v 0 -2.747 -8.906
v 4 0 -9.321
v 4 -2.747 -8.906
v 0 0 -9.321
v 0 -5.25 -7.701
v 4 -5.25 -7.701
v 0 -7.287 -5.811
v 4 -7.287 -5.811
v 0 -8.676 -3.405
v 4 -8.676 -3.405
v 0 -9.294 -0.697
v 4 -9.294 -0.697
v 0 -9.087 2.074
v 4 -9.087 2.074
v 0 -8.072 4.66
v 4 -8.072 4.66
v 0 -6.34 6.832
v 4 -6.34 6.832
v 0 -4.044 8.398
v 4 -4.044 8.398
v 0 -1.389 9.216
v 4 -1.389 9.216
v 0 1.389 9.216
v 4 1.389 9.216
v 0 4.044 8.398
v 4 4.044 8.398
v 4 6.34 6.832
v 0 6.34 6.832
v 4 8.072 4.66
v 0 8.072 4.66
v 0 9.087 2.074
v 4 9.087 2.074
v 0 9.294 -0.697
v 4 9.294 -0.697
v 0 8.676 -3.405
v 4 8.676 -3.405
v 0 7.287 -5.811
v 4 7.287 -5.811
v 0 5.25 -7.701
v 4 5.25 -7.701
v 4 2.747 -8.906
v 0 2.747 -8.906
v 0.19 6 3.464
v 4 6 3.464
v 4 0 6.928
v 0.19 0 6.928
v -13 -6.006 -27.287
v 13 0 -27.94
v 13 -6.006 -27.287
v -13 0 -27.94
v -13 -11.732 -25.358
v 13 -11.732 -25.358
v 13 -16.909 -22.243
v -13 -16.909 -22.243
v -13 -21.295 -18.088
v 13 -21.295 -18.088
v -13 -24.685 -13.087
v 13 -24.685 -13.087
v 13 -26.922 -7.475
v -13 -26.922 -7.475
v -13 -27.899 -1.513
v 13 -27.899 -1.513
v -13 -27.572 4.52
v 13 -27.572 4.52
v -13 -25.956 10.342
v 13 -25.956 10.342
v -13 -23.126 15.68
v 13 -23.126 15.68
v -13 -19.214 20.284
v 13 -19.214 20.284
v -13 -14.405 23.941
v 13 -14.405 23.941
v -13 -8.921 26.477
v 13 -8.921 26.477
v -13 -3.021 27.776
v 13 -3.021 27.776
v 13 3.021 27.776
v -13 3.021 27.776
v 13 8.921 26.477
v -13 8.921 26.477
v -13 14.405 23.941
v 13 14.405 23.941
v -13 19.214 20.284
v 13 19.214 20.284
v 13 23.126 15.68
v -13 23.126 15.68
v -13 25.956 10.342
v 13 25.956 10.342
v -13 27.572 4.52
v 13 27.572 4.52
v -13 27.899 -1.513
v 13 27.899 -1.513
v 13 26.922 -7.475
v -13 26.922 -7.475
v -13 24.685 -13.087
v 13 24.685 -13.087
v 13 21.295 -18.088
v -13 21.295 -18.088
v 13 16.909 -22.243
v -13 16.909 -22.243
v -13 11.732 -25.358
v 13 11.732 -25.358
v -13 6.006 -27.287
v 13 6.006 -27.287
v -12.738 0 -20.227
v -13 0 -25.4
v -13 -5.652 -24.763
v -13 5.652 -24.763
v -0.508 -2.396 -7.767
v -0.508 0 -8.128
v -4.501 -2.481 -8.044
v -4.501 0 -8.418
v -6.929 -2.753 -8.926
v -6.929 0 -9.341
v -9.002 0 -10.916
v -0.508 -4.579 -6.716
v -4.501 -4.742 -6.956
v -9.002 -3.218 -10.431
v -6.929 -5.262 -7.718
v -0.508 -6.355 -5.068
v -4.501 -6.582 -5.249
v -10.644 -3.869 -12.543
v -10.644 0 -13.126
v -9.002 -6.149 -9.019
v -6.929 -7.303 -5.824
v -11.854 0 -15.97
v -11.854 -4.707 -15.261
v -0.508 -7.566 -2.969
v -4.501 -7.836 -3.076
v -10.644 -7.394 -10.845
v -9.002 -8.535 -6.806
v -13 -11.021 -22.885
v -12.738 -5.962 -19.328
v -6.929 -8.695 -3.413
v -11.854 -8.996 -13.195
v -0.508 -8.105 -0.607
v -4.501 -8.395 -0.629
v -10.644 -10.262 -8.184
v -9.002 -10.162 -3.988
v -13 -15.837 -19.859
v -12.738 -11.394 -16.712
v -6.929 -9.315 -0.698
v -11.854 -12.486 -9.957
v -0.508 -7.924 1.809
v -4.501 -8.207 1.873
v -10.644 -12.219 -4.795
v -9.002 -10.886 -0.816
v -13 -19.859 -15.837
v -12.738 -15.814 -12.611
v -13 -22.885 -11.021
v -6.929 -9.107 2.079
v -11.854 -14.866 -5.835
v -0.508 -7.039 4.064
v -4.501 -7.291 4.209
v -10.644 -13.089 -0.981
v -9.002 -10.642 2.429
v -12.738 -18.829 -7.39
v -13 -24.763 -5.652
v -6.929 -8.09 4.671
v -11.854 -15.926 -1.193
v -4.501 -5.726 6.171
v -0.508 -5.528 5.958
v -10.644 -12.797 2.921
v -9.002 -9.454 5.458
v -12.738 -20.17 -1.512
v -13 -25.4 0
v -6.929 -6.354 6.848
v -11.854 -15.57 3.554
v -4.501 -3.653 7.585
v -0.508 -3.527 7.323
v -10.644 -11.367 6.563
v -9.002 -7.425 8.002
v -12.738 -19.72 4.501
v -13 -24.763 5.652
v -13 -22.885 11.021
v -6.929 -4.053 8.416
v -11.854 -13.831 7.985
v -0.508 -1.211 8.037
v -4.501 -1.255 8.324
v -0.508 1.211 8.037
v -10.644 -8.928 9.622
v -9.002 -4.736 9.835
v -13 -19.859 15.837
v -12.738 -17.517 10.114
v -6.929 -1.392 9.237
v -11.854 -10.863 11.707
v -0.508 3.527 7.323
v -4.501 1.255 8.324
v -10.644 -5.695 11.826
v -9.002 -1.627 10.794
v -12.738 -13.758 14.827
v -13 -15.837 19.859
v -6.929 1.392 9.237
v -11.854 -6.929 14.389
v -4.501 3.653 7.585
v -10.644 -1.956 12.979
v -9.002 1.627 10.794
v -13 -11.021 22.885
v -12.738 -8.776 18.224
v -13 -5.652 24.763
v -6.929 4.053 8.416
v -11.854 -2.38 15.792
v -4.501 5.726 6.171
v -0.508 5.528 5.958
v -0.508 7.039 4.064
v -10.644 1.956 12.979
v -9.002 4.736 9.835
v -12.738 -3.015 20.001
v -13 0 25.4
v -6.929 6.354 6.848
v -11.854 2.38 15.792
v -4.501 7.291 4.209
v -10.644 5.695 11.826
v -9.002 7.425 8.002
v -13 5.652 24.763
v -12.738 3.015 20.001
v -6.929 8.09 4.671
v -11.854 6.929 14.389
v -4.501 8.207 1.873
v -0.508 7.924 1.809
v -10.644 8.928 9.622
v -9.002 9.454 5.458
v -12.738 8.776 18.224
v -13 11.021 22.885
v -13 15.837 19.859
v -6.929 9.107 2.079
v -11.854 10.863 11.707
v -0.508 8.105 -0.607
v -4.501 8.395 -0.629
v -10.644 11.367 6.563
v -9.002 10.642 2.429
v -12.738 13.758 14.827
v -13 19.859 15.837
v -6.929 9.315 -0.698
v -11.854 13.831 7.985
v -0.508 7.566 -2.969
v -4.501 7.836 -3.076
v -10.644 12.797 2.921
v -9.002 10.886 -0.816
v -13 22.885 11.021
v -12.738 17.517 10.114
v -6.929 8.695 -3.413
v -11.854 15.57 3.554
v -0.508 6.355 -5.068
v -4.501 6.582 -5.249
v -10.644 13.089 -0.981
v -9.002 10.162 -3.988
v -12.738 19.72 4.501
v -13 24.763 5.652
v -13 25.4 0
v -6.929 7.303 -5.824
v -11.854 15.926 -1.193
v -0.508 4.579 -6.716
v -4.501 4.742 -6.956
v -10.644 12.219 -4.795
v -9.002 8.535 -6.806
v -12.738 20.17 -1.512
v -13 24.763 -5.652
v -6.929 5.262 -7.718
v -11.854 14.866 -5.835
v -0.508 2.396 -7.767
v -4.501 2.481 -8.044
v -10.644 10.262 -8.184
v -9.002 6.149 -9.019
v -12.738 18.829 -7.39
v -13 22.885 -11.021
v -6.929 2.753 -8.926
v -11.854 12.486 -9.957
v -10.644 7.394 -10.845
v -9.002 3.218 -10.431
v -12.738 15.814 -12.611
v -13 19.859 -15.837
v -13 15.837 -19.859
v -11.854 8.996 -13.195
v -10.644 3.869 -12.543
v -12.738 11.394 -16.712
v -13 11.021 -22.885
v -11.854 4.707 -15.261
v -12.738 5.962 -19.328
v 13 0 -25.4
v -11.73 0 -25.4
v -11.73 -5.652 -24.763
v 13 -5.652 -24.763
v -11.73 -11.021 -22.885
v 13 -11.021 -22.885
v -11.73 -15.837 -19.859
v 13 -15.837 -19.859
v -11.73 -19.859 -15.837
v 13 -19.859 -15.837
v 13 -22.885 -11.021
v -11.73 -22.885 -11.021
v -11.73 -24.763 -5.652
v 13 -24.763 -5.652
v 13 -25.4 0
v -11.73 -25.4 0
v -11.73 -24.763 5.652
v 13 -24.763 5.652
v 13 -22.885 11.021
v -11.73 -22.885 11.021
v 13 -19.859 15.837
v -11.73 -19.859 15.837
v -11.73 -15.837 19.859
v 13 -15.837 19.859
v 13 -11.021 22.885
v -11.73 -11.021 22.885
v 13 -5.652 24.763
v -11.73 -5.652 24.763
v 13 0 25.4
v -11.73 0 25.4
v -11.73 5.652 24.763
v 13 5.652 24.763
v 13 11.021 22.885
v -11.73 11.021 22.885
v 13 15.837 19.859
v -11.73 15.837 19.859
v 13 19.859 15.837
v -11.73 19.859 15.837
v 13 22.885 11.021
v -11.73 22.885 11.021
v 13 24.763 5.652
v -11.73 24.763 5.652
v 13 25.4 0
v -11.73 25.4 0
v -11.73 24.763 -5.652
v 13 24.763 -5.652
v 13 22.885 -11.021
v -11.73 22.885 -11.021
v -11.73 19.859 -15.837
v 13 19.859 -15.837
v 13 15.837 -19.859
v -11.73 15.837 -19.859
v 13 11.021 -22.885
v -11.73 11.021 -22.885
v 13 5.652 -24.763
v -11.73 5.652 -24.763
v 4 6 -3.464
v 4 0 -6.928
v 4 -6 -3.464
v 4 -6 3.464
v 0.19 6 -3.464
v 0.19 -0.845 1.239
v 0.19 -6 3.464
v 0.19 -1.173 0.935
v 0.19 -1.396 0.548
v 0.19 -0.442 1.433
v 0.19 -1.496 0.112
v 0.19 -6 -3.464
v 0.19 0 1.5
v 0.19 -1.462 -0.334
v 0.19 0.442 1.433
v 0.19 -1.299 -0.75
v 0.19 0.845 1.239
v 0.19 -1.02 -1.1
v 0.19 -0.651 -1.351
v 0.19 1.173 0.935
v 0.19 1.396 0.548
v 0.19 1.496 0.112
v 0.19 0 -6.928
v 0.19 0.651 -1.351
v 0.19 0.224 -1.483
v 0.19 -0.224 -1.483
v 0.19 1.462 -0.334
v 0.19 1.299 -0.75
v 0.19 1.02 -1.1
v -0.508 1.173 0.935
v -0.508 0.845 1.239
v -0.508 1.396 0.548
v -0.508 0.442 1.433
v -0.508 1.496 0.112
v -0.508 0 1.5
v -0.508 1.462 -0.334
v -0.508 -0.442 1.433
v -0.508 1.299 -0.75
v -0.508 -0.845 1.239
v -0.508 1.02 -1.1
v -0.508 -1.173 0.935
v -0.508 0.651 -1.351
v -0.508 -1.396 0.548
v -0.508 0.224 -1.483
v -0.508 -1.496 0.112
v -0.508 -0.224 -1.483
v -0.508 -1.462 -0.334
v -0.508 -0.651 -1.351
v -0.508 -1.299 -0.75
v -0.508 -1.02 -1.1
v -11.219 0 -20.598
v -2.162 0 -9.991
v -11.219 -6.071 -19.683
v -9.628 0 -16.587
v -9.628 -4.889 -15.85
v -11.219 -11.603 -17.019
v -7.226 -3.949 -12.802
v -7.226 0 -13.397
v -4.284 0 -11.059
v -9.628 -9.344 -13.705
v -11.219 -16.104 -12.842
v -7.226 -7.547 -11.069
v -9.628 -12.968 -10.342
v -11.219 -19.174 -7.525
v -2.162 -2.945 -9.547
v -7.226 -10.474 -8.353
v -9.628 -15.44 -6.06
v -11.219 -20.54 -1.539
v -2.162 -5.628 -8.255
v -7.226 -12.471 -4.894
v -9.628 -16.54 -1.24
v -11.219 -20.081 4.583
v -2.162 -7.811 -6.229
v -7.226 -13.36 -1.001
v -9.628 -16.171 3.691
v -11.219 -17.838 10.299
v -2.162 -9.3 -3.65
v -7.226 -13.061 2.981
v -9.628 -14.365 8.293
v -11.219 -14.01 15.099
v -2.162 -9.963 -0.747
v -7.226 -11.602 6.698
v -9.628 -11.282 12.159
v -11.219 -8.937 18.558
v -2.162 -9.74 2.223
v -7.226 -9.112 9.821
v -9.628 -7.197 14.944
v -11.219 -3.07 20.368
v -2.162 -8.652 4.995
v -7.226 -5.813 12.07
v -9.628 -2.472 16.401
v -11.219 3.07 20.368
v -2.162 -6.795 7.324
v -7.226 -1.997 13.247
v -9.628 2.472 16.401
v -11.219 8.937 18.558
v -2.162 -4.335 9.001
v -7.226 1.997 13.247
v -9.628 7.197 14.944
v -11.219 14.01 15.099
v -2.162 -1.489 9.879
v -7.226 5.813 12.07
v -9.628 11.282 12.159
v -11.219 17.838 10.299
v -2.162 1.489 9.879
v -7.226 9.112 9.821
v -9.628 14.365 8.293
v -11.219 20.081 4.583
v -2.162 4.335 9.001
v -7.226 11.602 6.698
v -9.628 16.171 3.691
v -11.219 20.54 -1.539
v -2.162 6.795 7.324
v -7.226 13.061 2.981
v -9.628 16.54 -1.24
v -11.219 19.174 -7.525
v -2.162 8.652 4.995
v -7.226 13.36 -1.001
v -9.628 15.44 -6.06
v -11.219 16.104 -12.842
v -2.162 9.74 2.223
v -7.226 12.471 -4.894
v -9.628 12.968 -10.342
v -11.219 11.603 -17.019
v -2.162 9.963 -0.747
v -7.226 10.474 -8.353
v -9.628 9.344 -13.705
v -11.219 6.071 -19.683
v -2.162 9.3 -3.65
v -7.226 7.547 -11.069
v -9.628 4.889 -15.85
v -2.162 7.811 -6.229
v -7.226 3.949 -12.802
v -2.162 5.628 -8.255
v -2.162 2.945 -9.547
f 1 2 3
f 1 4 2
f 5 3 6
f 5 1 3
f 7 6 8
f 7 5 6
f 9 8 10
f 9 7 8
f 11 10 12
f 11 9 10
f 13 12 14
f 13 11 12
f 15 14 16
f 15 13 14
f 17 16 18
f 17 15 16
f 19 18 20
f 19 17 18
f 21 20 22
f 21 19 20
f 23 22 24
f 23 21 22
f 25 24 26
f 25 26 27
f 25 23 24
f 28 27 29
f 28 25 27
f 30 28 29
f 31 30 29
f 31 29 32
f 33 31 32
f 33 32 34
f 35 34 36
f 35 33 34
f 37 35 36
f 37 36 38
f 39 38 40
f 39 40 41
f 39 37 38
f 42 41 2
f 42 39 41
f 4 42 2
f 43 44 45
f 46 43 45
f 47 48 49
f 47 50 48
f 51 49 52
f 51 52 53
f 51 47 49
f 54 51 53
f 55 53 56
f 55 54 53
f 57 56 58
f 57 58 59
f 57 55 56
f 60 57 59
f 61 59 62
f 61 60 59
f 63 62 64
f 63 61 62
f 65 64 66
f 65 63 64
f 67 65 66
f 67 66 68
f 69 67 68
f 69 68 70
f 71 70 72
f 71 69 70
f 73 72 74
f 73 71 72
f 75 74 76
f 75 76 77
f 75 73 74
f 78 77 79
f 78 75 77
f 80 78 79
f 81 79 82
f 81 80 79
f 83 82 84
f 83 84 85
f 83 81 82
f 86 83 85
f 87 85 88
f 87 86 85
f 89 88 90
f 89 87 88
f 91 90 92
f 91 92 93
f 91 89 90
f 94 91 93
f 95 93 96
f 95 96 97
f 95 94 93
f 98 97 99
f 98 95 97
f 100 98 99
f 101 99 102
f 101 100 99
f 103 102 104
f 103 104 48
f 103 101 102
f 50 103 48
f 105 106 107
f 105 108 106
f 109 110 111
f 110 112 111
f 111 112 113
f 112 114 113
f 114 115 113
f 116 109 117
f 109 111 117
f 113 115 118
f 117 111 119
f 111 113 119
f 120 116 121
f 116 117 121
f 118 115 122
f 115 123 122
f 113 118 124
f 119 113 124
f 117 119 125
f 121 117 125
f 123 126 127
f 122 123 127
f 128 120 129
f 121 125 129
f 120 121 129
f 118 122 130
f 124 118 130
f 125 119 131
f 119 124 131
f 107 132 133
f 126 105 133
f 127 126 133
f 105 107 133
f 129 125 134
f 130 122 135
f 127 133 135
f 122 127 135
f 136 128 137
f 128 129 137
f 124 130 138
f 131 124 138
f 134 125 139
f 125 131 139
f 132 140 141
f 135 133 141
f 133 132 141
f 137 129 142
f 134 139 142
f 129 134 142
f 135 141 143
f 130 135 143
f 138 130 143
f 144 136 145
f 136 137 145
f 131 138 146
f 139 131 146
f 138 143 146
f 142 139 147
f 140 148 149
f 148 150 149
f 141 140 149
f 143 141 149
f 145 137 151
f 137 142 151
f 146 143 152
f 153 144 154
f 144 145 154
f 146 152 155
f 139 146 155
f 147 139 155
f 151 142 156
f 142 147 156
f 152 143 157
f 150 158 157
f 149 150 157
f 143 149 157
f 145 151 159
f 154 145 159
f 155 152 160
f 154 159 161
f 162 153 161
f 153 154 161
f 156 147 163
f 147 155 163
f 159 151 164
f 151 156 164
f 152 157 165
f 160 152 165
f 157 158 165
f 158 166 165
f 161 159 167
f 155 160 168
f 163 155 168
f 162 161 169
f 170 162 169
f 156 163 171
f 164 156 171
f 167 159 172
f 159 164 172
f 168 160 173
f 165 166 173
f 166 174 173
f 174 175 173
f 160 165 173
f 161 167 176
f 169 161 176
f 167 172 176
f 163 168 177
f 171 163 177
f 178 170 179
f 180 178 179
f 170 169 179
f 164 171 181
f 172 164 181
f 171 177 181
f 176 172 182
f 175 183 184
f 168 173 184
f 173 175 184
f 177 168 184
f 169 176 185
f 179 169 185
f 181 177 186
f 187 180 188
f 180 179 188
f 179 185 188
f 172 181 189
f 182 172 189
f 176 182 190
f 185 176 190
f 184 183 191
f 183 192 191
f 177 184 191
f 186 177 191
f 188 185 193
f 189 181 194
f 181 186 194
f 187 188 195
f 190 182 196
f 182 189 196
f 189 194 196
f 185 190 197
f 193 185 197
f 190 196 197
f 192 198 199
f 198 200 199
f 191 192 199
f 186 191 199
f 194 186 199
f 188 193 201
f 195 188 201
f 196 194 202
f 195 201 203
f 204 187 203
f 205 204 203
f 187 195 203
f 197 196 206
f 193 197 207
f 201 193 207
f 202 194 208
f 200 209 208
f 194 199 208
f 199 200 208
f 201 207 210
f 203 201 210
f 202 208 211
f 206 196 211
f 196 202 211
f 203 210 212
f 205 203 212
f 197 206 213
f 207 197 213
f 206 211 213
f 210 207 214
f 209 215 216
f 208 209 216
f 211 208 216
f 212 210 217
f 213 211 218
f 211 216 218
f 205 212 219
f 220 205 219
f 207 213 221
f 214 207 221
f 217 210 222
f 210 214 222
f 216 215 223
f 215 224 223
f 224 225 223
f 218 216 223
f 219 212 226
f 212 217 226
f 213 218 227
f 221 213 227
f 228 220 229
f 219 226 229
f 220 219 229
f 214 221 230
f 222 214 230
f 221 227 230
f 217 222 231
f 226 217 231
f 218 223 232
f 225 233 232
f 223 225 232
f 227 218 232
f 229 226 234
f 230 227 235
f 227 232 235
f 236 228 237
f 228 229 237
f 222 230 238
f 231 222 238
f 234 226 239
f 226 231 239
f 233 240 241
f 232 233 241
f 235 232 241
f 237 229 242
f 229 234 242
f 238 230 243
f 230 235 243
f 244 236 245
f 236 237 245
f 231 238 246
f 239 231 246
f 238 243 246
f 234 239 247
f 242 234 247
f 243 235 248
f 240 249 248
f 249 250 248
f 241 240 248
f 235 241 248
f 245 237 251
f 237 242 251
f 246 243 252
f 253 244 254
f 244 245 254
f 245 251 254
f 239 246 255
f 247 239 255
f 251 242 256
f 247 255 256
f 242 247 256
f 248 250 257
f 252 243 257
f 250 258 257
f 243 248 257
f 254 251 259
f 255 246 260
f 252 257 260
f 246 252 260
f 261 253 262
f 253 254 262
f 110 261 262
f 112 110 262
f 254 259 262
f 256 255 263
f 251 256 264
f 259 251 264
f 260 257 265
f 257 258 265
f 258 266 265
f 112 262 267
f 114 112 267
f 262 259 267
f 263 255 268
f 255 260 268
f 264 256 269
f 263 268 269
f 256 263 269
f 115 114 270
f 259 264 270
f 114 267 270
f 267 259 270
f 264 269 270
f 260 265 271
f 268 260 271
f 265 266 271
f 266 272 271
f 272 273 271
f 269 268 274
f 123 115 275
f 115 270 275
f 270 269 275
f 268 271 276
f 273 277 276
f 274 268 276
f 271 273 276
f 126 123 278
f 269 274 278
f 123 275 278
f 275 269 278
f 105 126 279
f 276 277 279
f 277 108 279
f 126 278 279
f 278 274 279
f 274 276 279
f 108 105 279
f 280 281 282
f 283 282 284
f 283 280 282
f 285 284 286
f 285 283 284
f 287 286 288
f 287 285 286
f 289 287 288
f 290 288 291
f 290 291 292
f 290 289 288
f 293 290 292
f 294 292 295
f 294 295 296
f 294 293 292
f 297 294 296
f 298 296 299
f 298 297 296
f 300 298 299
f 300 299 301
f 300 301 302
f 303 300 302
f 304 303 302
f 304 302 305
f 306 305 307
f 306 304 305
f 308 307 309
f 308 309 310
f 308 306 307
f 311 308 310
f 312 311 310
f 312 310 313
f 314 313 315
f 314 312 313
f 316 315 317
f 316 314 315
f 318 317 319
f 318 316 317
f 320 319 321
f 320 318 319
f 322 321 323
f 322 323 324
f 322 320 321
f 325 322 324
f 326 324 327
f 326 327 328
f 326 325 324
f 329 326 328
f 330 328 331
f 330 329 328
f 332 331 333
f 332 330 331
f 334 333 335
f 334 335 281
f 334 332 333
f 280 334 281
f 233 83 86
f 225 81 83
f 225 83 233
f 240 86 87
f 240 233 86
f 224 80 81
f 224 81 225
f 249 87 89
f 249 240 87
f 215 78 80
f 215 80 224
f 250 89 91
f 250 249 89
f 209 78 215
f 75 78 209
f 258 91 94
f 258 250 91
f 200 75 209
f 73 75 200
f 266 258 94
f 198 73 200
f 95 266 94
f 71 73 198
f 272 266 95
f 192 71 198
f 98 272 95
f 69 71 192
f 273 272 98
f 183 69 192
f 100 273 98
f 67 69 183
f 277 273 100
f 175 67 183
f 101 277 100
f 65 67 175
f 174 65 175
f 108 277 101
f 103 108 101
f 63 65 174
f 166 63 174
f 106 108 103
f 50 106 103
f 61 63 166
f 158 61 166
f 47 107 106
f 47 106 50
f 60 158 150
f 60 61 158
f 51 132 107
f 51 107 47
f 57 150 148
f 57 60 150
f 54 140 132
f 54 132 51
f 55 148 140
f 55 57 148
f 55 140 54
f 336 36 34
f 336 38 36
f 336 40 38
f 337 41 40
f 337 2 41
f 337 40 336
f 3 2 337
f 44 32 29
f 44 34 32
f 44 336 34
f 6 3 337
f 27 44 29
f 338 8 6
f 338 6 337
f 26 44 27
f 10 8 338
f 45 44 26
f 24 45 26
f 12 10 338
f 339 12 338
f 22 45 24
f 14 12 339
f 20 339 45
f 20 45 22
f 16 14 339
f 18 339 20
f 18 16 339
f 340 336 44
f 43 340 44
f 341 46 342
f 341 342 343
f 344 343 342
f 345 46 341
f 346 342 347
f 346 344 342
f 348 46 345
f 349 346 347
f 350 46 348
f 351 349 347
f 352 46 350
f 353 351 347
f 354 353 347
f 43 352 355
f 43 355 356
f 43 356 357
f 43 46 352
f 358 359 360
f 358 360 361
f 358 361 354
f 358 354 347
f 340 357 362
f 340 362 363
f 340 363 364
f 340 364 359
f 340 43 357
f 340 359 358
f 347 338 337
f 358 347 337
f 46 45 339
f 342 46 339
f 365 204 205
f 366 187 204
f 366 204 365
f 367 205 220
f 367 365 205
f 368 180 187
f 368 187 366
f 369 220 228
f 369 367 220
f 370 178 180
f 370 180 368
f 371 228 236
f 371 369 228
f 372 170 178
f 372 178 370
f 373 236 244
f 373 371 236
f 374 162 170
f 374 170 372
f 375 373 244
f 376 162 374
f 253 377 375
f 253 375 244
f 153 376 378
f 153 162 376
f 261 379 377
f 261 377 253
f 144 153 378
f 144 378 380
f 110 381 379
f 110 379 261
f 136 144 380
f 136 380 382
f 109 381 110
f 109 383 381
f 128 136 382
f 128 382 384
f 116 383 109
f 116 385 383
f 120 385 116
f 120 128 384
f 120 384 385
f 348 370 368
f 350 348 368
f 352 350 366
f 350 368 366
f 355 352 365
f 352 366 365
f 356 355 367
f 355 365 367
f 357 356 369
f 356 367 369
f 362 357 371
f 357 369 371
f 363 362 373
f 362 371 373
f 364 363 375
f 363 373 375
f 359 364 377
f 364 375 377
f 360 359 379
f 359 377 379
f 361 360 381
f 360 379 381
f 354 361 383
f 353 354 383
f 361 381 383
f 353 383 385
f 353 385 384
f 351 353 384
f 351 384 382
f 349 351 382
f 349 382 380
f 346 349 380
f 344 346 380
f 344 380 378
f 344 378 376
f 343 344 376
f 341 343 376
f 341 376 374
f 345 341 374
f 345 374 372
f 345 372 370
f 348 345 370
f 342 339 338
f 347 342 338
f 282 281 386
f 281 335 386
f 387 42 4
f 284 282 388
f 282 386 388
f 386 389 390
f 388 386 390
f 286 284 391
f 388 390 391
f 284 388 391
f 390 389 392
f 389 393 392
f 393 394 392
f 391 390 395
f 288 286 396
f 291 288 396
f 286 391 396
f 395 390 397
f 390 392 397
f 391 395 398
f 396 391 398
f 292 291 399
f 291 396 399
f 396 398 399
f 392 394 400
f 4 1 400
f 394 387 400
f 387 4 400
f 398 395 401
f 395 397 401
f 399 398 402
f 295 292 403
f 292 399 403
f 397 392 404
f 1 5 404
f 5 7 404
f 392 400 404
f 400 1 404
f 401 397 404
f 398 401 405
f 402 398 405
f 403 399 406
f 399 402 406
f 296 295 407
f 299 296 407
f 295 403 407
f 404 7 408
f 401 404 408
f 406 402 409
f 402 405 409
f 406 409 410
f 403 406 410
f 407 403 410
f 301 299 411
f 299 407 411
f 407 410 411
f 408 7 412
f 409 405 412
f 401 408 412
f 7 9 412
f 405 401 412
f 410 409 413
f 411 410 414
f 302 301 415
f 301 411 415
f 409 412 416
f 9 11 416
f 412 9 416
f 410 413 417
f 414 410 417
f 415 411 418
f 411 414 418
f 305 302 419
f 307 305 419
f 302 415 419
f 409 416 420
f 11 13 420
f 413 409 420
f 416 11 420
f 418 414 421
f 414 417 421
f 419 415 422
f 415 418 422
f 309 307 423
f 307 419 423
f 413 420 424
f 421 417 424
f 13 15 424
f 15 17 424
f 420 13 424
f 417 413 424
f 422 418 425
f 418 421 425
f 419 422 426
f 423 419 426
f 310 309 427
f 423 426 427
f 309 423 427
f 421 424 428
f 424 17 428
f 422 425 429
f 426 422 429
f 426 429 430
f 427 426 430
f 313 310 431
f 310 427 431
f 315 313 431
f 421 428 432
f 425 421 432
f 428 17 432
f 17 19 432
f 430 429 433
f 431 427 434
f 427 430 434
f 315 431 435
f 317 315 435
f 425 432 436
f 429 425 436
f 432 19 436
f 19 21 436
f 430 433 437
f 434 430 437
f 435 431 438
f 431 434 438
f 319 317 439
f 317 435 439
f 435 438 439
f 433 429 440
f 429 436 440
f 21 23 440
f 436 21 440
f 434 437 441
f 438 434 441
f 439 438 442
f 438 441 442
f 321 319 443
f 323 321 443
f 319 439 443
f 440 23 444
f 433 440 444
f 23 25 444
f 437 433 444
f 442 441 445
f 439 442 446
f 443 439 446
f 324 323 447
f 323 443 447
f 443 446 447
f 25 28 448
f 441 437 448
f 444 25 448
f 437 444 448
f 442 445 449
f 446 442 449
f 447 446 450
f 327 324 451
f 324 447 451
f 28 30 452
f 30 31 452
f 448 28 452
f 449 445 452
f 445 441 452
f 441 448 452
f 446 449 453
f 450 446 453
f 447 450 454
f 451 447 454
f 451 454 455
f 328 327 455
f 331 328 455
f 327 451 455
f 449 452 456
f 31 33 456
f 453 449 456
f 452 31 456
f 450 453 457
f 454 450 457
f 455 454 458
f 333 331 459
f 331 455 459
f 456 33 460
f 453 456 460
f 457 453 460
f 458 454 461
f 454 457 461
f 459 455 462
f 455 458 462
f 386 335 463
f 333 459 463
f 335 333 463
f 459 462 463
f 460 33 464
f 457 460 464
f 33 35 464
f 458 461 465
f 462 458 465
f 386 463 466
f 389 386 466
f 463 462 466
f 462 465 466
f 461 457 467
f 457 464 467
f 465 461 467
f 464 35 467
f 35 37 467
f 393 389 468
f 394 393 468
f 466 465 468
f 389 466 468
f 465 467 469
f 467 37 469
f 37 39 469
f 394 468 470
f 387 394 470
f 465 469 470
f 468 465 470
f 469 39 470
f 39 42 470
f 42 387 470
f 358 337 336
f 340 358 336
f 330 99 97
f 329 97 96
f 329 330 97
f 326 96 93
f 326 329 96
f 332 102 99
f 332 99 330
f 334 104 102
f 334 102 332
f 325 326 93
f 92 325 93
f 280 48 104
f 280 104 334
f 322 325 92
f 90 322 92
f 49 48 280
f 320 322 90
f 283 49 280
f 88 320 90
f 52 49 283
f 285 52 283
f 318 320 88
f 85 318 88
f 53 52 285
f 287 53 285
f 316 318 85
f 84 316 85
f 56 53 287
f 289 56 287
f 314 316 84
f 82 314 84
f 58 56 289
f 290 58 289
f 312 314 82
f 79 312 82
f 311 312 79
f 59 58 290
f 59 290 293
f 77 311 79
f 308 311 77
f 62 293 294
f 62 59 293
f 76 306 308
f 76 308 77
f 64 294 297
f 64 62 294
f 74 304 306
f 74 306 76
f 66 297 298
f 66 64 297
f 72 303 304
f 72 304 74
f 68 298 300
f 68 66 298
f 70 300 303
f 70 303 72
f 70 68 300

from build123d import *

# Parameters (mm, degrees)
CUT_EXTRUDE1_DEPTH = 3.81
SKETCH6_R          = 1.5
CUT_EXTRUDE2_DEPTH = 14.508000035


with BuildPart() as part:
    # Sketch2 → Main Revolve (revolve)
    with BuildSketch(Plane(origin=(0, 0, 0), x_dir=(1, 0, 0), z_dir=(0, 1, 0))):
        with BuildLine():
            Line((4, 8.05052812), (4, 9.32052812))
            Line((4, 9.32052812), (0, 9.32052812))
            add(Edge.make_bspline(
                [(-11.730000035, 25.4), (-11.939852155, 16.185984948), (-5.767624941, 10.573485752), (0, 9.32052812)],
                knots=[0, 0, 0, 0, 1, 1, 1, 1], degree=3))
            Line((-11.730000035, 25.4), (13.000000035, 25.4))
            Line((13.000000035, 25.4), (13.000000035, 27.94))
            Line((13.000000035, 27.94), (-13.000000035, 27.94))
            Line((-13.000000035, 27.94), (-13.000000035, 25.4))
            add(Edge.make_bspline(
                [(-0.508, 8.128), (-13.159061445, 7.336688862), (-13.000000035, 25.4)],
                knots=[0, 0, 0, 1, 1, 1], degree=2))
            Line((-0.508, 8.128), (-0.508, 0))
            Line((-0.508, 0), (4, 0))
            Line((4, 0), (4, 8.05052812))
        make_face()
    revolve(axis=Axis((4, 0, 0), (-1, 0, 0)))

    # Sketch5 → Cut-Extrude1 (cut)
    with BuildSketch(Plane(origin=(4, 0, 0), x_dir=(0, 0, -1), z_dir=(1, 0, 0))):
        Polygon((6.92820323, 0), (3.464101615, 6), (-3.464101615, 6), (-6.92820323, 0), (-3.464101615, -6), (3.464101615, -6), align=None)
    extrude(amount=-CUT_EXTRUDE1_DEPTH, mode=Mode.SUBTRACT)

    # Sketch6 → Cut-Extrude2 (cut, through all)
    with BuildSketch(Plane.ZY.offset(0.508)):
        Circle(SKETCH6_R)
    extrude(amount=-CUT_EXTRUDE2_DEPTH, mode=Mode.SUBTRACT)


solid = part.part
